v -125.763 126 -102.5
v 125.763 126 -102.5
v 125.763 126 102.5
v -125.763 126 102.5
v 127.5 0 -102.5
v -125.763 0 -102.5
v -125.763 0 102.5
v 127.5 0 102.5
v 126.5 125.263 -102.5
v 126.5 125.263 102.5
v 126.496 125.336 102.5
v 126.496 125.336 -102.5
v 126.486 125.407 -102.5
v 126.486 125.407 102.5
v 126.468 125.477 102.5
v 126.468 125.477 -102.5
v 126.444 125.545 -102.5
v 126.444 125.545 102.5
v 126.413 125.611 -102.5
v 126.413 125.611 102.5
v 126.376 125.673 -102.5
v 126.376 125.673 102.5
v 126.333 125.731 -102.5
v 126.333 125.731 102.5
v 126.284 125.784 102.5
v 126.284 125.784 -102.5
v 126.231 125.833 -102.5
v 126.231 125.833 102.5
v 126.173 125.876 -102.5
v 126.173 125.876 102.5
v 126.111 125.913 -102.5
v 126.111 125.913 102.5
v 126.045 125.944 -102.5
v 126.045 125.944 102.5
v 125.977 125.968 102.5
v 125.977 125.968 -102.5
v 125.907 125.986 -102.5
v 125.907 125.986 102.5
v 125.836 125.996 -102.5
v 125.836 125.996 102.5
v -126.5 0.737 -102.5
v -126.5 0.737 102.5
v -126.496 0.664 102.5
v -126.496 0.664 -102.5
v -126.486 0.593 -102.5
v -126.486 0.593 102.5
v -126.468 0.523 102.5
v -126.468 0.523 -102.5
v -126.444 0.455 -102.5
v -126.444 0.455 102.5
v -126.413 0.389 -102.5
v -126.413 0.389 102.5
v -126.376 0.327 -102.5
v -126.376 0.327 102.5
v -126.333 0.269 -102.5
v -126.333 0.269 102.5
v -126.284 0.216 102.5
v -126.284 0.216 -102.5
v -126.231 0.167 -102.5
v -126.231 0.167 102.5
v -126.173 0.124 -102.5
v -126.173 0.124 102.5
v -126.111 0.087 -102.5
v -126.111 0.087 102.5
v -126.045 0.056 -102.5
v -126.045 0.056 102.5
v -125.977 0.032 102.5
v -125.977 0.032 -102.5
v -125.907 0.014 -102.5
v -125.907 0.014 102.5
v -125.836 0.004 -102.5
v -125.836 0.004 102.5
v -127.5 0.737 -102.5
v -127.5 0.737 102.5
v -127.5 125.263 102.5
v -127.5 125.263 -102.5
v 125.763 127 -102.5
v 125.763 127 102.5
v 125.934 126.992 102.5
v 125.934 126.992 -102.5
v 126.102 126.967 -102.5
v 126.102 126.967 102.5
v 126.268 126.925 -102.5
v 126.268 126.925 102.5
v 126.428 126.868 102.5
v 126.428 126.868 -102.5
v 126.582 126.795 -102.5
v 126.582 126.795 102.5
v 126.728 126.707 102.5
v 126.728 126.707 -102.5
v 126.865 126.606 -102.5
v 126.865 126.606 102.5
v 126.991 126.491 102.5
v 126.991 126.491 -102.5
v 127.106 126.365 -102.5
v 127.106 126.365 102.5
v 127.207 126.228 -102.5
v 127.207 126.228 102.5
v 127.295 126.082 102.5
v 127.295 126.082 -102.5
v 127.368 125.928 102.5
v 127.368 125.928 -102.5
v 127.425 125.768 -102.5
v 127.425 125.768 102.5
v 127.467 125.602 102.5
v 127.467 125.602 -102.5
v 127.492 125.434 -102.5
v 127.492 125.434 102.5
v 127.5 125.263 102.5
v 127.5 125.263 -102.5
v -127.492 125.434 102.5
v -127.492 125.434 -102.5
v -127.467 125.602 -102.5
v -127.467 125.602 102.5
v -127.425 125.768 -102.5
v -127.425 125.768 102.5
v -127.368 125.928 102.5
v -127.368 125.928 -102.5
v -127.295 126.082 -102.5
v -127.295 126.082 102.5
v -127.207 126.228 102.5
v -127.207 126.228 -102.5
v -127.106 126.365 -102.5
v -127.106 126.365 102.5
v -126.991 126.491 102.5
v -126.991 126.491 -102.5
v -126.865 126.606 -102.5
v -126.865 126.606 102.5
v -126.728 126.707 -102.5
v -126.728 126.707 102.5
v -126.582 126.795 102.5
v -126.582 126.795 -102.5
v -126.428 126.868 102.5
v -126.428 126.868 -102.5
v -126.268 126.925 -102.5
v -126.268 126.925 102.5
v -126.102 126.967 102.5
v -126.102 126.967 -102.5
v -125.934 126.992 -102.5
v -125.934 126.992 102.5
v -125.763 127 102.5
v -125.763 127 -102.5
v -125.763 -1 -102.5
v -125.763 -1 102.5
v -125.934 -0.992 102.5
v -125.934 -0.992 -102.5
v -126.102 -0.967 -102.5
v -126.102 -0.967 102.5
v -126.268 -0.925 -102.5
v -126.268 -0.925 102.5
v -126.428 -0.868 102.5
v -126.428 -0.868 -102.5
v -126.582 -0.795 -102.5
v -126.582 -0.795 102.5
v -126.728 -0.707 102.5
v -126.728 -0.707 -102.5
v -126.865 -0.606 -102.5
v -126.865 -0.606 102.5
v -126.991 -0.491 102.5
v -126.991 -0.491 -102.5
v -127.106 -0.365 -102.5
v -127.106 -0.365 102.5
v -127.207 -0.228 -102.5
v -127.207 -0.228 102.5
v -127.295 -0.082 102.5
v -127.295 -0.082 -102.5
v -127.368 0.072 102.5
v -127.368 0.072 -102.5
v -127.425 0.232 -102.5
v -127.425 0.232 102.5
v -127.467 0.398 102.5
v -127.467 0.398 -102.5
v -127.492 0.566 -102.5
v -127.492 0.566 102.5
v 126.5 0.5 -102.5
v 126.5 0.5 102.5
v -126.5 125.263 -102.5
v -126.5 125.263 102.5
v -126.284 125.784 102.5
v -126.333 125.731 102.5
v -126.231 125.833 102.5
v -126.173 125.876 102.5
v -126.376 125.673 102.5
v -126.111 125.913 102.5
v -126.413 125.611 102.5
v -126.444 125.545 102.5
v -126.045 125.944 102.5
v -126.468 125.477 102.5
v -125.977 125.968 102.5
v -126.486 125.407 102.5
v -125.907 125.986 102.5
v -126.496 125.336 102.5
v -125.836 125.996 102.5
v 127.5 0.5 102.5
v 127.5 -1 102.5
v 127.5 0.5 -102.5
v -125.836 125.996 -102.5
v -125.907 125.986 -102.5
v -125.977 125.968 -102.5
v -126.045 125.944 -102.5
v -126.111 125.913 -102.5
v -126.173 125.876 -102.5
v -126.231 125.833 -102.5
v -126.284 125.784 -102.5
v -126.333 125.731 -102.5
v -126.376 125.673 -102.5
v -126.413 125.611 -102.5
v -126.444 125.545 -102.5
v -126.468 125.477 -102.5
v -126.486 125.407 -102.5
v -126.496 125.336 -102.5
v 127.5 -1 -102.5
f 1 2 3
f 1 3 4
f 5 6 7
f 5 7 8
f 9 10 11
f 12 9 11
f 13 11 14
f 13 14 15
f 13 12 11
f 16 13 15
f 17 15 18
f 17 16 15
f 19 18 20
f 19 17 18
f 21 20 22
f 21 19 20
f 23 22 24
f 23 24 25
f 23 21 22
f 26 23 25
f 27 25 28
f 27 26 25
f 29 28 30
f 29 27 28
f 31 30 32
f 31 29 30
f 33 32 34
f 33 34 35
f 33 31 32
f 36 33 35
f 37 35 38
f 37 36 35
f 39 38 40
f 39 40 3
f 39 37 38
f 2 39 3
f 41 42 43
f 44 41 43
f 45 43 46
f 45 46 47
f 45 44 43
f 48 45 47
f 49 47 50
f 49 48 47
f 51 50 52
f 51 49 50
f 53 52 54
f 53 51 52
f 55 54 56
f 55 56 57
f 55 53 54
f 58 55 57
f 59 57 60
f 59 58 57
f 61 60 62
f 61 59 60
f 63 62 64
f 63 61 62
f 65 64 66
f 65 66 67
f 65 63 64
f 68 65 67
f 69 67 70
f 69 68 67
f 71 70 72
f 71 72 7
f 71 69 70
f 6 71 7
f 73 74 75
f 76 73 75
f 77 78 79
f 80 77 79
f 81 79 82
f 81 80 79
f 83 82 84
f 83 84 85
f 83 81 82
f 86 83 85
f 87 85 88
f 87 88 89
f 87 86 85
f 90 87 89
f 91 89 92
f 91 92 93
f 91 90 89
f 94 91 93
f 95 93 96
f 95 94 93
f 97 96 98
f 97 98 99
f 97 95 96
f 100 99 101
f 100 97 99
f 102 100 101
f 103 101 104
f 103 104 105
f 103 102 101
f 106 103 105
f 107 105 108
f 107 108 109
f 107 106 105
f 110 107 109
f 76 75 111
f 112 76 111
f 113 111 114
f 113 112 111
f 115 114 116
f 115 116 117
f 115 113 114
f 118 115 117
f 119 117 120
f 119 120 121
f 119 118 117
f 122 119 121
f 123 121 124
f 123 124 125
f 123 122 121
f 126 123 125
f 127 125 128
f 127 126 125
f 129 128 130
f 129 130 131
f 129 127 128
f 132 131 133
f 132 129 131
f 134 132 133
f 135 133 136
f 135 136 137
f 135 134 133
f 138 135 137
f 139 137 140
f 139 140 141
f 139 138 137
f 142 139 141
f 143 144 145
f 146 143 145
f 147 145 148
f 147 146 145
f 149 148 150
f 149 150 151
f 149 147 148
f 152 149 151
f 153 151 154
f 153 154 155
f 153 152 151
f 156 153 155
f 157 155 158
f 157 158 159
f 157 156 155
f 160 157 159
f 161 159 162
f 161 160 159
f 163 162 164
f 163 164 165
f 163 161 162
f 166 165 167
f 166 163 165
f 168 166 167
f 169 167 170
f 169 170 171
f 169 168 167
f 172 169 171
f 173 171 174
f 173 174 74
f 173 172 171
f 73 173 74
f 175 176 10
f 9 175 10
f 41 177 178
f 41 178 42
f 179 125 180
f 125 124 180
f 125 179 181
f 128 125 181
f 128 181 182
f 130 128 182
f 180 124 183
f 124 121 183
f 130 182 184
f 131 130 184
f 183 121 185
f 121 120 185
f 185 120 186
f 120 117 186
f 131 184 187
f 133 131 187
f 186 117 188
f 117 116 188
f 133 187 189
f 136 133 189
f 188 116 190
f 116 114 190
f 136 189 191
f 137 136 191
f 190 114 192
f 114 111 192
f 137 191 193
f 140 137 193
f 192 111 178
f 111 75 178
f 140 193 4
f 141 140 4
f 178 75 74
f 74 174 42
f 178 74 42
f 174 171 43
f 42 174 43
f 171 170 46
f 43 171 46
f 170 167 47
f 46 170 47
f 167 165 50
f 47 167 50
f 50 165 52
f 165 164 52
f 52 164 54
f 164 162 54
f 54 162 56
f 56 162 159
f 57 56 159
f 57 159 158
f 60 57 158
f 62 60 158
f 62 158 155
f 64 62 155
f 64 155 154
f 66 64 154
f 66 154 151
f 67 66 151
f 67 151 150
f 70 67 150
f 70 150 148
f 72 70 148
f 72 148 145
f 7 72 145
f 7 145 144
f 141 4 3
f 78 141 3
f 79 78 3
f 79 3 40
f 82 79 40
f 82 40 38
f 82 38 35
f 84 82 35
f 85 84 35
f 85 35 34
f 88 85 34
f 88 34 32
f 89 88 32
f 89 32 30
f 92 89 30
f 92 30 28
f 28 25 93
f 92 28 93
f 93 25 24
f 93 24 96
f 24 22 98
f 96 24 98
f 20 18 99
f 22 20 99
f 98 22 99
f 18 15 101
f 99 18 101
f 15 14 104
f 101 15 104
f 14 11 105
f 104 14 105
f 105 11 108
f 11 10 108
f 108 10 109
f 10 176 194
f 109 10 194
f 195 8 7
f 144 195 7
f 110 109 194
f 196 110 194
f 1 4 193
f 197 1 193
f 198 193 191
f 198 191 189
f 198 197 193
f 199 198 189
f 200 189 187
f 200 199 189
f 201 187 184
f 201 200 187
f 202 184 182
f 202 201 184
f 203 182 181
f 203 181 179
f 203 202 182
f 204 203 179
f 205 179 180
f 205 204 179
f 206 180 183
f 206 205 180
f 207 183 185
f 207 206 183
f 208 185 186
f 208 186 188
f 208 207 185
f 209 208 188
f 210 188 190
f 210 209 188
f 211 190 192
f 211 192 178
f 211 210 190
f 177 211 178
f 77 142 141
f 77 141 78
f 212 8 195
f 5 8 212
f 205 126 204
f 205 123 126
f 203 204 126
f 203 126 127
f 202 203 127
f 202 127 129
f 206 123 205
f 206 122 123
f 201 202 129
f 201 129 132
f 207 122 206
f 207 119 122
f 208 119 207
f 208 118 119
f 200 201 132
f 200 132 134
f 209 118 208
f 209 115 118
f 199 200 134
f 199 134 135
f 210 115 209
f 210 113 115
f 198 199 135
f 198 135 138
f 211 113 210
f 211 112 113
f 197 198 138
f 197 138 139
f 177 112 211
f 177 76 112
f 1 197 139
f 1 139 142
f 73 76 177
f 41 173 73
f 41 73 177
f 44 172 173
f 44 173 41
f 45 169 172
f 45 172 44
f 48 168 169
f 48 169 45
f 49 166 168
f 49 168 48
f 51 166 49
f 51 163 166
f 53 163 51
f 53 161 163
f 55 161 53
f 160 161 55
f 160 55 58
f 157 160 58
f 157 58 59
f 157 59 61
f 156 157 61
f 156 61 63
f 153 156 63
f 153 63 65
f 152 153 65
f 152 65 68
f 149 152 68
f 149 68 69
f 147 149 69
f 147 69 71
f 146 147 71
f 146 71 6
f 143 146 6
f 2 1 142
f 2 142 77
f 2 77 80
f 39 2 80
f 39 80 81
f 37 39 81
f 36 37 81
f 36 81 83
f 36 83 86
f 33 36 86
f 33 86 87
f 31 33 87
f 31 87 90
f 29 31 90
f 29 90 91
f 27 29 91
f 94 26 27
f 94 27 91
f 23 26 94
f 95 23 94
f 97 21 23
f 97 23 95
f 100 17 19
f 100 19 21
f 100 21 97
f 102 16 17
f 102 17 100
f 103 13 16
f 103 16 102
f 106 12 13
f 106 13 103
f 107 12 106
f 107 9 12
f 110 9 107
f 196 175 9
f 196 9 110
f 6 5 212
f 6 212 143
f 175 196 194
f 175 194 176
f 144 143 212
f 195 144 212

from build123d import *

# Parameters (mm, degrees)
SKETCH1_W                    = 255
SKETCH1_H                    = 205
BASE_FLANGE1_DEPTH           = 1
EDGE_FLANGE1_STRIP_W         = 5.4732
EDGE_FLANGE1_STRIP_H         = 1
EDGE_FLANGE1_STRIP_CUT_DEPTH = 205
EDGE_FLANGE1_DEPTH           = 205
EDGE_FLANGE2_STRIP_W         = 5.4732
EDGE_FLANGE2_STRIP_H         = 1
EDGE_FLANGE2_STRIP_CUT_DEPTH = 205
EDGE_FLANGE2_DEPTH           = 205
EDGE_FLANGE3_STRIP_W         = 5.4732
EDGE_FLANGE3_STRIP_H         = 1
EDGE_FLANGE3_STRIP_CUT_DEPTH = 205
EDGE_FLANGE3_DEPTH           = 205


# Sheet-metal steps are written as plain solids
with BuildPart() as part:
    # Sketch1 → Base-Flange1 (new body)
    with BuildSketch(Plane(origin=(0, 0, 0), x_dir=(1, 0, 0), z_dir=(0, 1, 0))):
        Rectangle(SKETCH1_W, SKETCH1_H)
    extrude(amount=-BASE_FLANGE1_DEPTH)

    # Edge-Flange1 strip (across the edge) → Edge-Flange1 strip cut (cut)
    with BuildSketch(Plane(origin=(-127.5, 0, -102.5), x_dir=(1, 0, 0), z_dir=(0, 0, 1))):
        with Locations((-1, -0.5)):
            Rectangle(EDGE_FLANGE1_STRIP_W, EDGE_FLANGE1_STRIP_H)
    extrude(amount=EDGE_FLANGE1_STRIP_CUT_DEPTH, mode=Mode.SUBTRACT)

    # Edge-Flange1 section (across the edge) → Edge-Flange1 (add)
    with BuildSketch(Plane(origin=(-127.5, 0, -102.5), x_dir=(1, 0, 0), z_dir=(0, 0, 1))):
        with BuildLine():
            Line((0, 0.7366), (0, 127))
            Line((0, 127), (1, 127))
            Line((1, 127), (1, 0.7366))
            ThreePointArc((1, 0.7366), (1.215745145, 0.215745145), (1.7366, 0))
            Line((1.7366, 0), (1.7366, -1))
            ThreePointArc((1.7366, -1), (0.508638364, -0.491361636), (0, 0.7366))
        make_face()
    extrude(amount=EDGE_FLANGE1_DEPTH)

    # Edge-Flange2 strip (across the edge) → Edge-Flange2 strip cut (cut)
    with BuildSketch(Plane(origin=(-126.5, 127, -102.5), x_dir=(0, -1, 0), z_dir=(0, 0, 1))):
        with Locations((-1, -0.5)):
            Rectangle(EDGE_FLANGE2_STRIP_W, EDGE_FLANGE2_STRIP_H)
    extrude(amount=EDGE_FLANGE2_STRIP_CUT_DEPTH, mode=Mode.SUBTRACT)

    # Edge-Flange2 section (across the edge) → Edge-Flange2 (add)
    with BuildSketch(Plane(origin=(-126.5, 127, -102.5), x_dir=(0, -1, 0), z_dir=(0, 0, 1))):
        with BuildLine():
            Line((0, 0.7366), (0, 254))
            Line((0, 254), (1, 254))
            Line((1, 254), (1, 0.7366))
            ThreePointArc((1, 0.7366), (1.215745145, 0.215745145), (1.7366, 0))
            Line((1.7366, 0), (1.7366, -1))
            ThreePointArc((1.7366, -1), (0.508638364, -0.491361636), (0, 0.7366))
        make_face()
    extrude(amount=EDGE_FLANGE2_DEPTH)

    # Edge-Flange3 strip (across the edge) → Edge-Flange3 strip cut (cut)
    with BuildSketch(Plane(origin=(127.5, 126, -102.5), x_dir=(-1, 0, 0), z_dir=(0, 0, 1))):
        with Locations((-1, -0.5)):
            Rectangle(EDGE_FLANGE3_STRIP_W, EDGE_FLANGE3_STRIP_H)
    extrude(amount=EDGE_FLANGE3_STRIP_CUT_DEPTH, mode=Mode.SUBTRACT)

    # Edge-Flange3 section (across the edge) → Edge-Flange3 (add)
    with BuildSketch(Plane(origin=(127.5, 126, -102.5), x_dir=(-1, 0, 0), z_dir=(0, 0, 1))):
        with BuildLine():
            Line((0, 0.7366), (0, 125.5))
            Line((0, 125.5), (1, 125.5))
            Line((1, 125.5), (1, 0.7366))
            ThreePointArc((1, 0.7366), (1.215745145, 0.215745145), (1.7366, 0))
            Line((1.7366, 0), (1.7366, -1))
            ThreePointArc((1.7366, -1), (0.508638364, -0.491361636), (0, 0.7366))
        make_face()
    extrude(amount=EDGE_FLANGE3_DEPTH)


solid = part.part
